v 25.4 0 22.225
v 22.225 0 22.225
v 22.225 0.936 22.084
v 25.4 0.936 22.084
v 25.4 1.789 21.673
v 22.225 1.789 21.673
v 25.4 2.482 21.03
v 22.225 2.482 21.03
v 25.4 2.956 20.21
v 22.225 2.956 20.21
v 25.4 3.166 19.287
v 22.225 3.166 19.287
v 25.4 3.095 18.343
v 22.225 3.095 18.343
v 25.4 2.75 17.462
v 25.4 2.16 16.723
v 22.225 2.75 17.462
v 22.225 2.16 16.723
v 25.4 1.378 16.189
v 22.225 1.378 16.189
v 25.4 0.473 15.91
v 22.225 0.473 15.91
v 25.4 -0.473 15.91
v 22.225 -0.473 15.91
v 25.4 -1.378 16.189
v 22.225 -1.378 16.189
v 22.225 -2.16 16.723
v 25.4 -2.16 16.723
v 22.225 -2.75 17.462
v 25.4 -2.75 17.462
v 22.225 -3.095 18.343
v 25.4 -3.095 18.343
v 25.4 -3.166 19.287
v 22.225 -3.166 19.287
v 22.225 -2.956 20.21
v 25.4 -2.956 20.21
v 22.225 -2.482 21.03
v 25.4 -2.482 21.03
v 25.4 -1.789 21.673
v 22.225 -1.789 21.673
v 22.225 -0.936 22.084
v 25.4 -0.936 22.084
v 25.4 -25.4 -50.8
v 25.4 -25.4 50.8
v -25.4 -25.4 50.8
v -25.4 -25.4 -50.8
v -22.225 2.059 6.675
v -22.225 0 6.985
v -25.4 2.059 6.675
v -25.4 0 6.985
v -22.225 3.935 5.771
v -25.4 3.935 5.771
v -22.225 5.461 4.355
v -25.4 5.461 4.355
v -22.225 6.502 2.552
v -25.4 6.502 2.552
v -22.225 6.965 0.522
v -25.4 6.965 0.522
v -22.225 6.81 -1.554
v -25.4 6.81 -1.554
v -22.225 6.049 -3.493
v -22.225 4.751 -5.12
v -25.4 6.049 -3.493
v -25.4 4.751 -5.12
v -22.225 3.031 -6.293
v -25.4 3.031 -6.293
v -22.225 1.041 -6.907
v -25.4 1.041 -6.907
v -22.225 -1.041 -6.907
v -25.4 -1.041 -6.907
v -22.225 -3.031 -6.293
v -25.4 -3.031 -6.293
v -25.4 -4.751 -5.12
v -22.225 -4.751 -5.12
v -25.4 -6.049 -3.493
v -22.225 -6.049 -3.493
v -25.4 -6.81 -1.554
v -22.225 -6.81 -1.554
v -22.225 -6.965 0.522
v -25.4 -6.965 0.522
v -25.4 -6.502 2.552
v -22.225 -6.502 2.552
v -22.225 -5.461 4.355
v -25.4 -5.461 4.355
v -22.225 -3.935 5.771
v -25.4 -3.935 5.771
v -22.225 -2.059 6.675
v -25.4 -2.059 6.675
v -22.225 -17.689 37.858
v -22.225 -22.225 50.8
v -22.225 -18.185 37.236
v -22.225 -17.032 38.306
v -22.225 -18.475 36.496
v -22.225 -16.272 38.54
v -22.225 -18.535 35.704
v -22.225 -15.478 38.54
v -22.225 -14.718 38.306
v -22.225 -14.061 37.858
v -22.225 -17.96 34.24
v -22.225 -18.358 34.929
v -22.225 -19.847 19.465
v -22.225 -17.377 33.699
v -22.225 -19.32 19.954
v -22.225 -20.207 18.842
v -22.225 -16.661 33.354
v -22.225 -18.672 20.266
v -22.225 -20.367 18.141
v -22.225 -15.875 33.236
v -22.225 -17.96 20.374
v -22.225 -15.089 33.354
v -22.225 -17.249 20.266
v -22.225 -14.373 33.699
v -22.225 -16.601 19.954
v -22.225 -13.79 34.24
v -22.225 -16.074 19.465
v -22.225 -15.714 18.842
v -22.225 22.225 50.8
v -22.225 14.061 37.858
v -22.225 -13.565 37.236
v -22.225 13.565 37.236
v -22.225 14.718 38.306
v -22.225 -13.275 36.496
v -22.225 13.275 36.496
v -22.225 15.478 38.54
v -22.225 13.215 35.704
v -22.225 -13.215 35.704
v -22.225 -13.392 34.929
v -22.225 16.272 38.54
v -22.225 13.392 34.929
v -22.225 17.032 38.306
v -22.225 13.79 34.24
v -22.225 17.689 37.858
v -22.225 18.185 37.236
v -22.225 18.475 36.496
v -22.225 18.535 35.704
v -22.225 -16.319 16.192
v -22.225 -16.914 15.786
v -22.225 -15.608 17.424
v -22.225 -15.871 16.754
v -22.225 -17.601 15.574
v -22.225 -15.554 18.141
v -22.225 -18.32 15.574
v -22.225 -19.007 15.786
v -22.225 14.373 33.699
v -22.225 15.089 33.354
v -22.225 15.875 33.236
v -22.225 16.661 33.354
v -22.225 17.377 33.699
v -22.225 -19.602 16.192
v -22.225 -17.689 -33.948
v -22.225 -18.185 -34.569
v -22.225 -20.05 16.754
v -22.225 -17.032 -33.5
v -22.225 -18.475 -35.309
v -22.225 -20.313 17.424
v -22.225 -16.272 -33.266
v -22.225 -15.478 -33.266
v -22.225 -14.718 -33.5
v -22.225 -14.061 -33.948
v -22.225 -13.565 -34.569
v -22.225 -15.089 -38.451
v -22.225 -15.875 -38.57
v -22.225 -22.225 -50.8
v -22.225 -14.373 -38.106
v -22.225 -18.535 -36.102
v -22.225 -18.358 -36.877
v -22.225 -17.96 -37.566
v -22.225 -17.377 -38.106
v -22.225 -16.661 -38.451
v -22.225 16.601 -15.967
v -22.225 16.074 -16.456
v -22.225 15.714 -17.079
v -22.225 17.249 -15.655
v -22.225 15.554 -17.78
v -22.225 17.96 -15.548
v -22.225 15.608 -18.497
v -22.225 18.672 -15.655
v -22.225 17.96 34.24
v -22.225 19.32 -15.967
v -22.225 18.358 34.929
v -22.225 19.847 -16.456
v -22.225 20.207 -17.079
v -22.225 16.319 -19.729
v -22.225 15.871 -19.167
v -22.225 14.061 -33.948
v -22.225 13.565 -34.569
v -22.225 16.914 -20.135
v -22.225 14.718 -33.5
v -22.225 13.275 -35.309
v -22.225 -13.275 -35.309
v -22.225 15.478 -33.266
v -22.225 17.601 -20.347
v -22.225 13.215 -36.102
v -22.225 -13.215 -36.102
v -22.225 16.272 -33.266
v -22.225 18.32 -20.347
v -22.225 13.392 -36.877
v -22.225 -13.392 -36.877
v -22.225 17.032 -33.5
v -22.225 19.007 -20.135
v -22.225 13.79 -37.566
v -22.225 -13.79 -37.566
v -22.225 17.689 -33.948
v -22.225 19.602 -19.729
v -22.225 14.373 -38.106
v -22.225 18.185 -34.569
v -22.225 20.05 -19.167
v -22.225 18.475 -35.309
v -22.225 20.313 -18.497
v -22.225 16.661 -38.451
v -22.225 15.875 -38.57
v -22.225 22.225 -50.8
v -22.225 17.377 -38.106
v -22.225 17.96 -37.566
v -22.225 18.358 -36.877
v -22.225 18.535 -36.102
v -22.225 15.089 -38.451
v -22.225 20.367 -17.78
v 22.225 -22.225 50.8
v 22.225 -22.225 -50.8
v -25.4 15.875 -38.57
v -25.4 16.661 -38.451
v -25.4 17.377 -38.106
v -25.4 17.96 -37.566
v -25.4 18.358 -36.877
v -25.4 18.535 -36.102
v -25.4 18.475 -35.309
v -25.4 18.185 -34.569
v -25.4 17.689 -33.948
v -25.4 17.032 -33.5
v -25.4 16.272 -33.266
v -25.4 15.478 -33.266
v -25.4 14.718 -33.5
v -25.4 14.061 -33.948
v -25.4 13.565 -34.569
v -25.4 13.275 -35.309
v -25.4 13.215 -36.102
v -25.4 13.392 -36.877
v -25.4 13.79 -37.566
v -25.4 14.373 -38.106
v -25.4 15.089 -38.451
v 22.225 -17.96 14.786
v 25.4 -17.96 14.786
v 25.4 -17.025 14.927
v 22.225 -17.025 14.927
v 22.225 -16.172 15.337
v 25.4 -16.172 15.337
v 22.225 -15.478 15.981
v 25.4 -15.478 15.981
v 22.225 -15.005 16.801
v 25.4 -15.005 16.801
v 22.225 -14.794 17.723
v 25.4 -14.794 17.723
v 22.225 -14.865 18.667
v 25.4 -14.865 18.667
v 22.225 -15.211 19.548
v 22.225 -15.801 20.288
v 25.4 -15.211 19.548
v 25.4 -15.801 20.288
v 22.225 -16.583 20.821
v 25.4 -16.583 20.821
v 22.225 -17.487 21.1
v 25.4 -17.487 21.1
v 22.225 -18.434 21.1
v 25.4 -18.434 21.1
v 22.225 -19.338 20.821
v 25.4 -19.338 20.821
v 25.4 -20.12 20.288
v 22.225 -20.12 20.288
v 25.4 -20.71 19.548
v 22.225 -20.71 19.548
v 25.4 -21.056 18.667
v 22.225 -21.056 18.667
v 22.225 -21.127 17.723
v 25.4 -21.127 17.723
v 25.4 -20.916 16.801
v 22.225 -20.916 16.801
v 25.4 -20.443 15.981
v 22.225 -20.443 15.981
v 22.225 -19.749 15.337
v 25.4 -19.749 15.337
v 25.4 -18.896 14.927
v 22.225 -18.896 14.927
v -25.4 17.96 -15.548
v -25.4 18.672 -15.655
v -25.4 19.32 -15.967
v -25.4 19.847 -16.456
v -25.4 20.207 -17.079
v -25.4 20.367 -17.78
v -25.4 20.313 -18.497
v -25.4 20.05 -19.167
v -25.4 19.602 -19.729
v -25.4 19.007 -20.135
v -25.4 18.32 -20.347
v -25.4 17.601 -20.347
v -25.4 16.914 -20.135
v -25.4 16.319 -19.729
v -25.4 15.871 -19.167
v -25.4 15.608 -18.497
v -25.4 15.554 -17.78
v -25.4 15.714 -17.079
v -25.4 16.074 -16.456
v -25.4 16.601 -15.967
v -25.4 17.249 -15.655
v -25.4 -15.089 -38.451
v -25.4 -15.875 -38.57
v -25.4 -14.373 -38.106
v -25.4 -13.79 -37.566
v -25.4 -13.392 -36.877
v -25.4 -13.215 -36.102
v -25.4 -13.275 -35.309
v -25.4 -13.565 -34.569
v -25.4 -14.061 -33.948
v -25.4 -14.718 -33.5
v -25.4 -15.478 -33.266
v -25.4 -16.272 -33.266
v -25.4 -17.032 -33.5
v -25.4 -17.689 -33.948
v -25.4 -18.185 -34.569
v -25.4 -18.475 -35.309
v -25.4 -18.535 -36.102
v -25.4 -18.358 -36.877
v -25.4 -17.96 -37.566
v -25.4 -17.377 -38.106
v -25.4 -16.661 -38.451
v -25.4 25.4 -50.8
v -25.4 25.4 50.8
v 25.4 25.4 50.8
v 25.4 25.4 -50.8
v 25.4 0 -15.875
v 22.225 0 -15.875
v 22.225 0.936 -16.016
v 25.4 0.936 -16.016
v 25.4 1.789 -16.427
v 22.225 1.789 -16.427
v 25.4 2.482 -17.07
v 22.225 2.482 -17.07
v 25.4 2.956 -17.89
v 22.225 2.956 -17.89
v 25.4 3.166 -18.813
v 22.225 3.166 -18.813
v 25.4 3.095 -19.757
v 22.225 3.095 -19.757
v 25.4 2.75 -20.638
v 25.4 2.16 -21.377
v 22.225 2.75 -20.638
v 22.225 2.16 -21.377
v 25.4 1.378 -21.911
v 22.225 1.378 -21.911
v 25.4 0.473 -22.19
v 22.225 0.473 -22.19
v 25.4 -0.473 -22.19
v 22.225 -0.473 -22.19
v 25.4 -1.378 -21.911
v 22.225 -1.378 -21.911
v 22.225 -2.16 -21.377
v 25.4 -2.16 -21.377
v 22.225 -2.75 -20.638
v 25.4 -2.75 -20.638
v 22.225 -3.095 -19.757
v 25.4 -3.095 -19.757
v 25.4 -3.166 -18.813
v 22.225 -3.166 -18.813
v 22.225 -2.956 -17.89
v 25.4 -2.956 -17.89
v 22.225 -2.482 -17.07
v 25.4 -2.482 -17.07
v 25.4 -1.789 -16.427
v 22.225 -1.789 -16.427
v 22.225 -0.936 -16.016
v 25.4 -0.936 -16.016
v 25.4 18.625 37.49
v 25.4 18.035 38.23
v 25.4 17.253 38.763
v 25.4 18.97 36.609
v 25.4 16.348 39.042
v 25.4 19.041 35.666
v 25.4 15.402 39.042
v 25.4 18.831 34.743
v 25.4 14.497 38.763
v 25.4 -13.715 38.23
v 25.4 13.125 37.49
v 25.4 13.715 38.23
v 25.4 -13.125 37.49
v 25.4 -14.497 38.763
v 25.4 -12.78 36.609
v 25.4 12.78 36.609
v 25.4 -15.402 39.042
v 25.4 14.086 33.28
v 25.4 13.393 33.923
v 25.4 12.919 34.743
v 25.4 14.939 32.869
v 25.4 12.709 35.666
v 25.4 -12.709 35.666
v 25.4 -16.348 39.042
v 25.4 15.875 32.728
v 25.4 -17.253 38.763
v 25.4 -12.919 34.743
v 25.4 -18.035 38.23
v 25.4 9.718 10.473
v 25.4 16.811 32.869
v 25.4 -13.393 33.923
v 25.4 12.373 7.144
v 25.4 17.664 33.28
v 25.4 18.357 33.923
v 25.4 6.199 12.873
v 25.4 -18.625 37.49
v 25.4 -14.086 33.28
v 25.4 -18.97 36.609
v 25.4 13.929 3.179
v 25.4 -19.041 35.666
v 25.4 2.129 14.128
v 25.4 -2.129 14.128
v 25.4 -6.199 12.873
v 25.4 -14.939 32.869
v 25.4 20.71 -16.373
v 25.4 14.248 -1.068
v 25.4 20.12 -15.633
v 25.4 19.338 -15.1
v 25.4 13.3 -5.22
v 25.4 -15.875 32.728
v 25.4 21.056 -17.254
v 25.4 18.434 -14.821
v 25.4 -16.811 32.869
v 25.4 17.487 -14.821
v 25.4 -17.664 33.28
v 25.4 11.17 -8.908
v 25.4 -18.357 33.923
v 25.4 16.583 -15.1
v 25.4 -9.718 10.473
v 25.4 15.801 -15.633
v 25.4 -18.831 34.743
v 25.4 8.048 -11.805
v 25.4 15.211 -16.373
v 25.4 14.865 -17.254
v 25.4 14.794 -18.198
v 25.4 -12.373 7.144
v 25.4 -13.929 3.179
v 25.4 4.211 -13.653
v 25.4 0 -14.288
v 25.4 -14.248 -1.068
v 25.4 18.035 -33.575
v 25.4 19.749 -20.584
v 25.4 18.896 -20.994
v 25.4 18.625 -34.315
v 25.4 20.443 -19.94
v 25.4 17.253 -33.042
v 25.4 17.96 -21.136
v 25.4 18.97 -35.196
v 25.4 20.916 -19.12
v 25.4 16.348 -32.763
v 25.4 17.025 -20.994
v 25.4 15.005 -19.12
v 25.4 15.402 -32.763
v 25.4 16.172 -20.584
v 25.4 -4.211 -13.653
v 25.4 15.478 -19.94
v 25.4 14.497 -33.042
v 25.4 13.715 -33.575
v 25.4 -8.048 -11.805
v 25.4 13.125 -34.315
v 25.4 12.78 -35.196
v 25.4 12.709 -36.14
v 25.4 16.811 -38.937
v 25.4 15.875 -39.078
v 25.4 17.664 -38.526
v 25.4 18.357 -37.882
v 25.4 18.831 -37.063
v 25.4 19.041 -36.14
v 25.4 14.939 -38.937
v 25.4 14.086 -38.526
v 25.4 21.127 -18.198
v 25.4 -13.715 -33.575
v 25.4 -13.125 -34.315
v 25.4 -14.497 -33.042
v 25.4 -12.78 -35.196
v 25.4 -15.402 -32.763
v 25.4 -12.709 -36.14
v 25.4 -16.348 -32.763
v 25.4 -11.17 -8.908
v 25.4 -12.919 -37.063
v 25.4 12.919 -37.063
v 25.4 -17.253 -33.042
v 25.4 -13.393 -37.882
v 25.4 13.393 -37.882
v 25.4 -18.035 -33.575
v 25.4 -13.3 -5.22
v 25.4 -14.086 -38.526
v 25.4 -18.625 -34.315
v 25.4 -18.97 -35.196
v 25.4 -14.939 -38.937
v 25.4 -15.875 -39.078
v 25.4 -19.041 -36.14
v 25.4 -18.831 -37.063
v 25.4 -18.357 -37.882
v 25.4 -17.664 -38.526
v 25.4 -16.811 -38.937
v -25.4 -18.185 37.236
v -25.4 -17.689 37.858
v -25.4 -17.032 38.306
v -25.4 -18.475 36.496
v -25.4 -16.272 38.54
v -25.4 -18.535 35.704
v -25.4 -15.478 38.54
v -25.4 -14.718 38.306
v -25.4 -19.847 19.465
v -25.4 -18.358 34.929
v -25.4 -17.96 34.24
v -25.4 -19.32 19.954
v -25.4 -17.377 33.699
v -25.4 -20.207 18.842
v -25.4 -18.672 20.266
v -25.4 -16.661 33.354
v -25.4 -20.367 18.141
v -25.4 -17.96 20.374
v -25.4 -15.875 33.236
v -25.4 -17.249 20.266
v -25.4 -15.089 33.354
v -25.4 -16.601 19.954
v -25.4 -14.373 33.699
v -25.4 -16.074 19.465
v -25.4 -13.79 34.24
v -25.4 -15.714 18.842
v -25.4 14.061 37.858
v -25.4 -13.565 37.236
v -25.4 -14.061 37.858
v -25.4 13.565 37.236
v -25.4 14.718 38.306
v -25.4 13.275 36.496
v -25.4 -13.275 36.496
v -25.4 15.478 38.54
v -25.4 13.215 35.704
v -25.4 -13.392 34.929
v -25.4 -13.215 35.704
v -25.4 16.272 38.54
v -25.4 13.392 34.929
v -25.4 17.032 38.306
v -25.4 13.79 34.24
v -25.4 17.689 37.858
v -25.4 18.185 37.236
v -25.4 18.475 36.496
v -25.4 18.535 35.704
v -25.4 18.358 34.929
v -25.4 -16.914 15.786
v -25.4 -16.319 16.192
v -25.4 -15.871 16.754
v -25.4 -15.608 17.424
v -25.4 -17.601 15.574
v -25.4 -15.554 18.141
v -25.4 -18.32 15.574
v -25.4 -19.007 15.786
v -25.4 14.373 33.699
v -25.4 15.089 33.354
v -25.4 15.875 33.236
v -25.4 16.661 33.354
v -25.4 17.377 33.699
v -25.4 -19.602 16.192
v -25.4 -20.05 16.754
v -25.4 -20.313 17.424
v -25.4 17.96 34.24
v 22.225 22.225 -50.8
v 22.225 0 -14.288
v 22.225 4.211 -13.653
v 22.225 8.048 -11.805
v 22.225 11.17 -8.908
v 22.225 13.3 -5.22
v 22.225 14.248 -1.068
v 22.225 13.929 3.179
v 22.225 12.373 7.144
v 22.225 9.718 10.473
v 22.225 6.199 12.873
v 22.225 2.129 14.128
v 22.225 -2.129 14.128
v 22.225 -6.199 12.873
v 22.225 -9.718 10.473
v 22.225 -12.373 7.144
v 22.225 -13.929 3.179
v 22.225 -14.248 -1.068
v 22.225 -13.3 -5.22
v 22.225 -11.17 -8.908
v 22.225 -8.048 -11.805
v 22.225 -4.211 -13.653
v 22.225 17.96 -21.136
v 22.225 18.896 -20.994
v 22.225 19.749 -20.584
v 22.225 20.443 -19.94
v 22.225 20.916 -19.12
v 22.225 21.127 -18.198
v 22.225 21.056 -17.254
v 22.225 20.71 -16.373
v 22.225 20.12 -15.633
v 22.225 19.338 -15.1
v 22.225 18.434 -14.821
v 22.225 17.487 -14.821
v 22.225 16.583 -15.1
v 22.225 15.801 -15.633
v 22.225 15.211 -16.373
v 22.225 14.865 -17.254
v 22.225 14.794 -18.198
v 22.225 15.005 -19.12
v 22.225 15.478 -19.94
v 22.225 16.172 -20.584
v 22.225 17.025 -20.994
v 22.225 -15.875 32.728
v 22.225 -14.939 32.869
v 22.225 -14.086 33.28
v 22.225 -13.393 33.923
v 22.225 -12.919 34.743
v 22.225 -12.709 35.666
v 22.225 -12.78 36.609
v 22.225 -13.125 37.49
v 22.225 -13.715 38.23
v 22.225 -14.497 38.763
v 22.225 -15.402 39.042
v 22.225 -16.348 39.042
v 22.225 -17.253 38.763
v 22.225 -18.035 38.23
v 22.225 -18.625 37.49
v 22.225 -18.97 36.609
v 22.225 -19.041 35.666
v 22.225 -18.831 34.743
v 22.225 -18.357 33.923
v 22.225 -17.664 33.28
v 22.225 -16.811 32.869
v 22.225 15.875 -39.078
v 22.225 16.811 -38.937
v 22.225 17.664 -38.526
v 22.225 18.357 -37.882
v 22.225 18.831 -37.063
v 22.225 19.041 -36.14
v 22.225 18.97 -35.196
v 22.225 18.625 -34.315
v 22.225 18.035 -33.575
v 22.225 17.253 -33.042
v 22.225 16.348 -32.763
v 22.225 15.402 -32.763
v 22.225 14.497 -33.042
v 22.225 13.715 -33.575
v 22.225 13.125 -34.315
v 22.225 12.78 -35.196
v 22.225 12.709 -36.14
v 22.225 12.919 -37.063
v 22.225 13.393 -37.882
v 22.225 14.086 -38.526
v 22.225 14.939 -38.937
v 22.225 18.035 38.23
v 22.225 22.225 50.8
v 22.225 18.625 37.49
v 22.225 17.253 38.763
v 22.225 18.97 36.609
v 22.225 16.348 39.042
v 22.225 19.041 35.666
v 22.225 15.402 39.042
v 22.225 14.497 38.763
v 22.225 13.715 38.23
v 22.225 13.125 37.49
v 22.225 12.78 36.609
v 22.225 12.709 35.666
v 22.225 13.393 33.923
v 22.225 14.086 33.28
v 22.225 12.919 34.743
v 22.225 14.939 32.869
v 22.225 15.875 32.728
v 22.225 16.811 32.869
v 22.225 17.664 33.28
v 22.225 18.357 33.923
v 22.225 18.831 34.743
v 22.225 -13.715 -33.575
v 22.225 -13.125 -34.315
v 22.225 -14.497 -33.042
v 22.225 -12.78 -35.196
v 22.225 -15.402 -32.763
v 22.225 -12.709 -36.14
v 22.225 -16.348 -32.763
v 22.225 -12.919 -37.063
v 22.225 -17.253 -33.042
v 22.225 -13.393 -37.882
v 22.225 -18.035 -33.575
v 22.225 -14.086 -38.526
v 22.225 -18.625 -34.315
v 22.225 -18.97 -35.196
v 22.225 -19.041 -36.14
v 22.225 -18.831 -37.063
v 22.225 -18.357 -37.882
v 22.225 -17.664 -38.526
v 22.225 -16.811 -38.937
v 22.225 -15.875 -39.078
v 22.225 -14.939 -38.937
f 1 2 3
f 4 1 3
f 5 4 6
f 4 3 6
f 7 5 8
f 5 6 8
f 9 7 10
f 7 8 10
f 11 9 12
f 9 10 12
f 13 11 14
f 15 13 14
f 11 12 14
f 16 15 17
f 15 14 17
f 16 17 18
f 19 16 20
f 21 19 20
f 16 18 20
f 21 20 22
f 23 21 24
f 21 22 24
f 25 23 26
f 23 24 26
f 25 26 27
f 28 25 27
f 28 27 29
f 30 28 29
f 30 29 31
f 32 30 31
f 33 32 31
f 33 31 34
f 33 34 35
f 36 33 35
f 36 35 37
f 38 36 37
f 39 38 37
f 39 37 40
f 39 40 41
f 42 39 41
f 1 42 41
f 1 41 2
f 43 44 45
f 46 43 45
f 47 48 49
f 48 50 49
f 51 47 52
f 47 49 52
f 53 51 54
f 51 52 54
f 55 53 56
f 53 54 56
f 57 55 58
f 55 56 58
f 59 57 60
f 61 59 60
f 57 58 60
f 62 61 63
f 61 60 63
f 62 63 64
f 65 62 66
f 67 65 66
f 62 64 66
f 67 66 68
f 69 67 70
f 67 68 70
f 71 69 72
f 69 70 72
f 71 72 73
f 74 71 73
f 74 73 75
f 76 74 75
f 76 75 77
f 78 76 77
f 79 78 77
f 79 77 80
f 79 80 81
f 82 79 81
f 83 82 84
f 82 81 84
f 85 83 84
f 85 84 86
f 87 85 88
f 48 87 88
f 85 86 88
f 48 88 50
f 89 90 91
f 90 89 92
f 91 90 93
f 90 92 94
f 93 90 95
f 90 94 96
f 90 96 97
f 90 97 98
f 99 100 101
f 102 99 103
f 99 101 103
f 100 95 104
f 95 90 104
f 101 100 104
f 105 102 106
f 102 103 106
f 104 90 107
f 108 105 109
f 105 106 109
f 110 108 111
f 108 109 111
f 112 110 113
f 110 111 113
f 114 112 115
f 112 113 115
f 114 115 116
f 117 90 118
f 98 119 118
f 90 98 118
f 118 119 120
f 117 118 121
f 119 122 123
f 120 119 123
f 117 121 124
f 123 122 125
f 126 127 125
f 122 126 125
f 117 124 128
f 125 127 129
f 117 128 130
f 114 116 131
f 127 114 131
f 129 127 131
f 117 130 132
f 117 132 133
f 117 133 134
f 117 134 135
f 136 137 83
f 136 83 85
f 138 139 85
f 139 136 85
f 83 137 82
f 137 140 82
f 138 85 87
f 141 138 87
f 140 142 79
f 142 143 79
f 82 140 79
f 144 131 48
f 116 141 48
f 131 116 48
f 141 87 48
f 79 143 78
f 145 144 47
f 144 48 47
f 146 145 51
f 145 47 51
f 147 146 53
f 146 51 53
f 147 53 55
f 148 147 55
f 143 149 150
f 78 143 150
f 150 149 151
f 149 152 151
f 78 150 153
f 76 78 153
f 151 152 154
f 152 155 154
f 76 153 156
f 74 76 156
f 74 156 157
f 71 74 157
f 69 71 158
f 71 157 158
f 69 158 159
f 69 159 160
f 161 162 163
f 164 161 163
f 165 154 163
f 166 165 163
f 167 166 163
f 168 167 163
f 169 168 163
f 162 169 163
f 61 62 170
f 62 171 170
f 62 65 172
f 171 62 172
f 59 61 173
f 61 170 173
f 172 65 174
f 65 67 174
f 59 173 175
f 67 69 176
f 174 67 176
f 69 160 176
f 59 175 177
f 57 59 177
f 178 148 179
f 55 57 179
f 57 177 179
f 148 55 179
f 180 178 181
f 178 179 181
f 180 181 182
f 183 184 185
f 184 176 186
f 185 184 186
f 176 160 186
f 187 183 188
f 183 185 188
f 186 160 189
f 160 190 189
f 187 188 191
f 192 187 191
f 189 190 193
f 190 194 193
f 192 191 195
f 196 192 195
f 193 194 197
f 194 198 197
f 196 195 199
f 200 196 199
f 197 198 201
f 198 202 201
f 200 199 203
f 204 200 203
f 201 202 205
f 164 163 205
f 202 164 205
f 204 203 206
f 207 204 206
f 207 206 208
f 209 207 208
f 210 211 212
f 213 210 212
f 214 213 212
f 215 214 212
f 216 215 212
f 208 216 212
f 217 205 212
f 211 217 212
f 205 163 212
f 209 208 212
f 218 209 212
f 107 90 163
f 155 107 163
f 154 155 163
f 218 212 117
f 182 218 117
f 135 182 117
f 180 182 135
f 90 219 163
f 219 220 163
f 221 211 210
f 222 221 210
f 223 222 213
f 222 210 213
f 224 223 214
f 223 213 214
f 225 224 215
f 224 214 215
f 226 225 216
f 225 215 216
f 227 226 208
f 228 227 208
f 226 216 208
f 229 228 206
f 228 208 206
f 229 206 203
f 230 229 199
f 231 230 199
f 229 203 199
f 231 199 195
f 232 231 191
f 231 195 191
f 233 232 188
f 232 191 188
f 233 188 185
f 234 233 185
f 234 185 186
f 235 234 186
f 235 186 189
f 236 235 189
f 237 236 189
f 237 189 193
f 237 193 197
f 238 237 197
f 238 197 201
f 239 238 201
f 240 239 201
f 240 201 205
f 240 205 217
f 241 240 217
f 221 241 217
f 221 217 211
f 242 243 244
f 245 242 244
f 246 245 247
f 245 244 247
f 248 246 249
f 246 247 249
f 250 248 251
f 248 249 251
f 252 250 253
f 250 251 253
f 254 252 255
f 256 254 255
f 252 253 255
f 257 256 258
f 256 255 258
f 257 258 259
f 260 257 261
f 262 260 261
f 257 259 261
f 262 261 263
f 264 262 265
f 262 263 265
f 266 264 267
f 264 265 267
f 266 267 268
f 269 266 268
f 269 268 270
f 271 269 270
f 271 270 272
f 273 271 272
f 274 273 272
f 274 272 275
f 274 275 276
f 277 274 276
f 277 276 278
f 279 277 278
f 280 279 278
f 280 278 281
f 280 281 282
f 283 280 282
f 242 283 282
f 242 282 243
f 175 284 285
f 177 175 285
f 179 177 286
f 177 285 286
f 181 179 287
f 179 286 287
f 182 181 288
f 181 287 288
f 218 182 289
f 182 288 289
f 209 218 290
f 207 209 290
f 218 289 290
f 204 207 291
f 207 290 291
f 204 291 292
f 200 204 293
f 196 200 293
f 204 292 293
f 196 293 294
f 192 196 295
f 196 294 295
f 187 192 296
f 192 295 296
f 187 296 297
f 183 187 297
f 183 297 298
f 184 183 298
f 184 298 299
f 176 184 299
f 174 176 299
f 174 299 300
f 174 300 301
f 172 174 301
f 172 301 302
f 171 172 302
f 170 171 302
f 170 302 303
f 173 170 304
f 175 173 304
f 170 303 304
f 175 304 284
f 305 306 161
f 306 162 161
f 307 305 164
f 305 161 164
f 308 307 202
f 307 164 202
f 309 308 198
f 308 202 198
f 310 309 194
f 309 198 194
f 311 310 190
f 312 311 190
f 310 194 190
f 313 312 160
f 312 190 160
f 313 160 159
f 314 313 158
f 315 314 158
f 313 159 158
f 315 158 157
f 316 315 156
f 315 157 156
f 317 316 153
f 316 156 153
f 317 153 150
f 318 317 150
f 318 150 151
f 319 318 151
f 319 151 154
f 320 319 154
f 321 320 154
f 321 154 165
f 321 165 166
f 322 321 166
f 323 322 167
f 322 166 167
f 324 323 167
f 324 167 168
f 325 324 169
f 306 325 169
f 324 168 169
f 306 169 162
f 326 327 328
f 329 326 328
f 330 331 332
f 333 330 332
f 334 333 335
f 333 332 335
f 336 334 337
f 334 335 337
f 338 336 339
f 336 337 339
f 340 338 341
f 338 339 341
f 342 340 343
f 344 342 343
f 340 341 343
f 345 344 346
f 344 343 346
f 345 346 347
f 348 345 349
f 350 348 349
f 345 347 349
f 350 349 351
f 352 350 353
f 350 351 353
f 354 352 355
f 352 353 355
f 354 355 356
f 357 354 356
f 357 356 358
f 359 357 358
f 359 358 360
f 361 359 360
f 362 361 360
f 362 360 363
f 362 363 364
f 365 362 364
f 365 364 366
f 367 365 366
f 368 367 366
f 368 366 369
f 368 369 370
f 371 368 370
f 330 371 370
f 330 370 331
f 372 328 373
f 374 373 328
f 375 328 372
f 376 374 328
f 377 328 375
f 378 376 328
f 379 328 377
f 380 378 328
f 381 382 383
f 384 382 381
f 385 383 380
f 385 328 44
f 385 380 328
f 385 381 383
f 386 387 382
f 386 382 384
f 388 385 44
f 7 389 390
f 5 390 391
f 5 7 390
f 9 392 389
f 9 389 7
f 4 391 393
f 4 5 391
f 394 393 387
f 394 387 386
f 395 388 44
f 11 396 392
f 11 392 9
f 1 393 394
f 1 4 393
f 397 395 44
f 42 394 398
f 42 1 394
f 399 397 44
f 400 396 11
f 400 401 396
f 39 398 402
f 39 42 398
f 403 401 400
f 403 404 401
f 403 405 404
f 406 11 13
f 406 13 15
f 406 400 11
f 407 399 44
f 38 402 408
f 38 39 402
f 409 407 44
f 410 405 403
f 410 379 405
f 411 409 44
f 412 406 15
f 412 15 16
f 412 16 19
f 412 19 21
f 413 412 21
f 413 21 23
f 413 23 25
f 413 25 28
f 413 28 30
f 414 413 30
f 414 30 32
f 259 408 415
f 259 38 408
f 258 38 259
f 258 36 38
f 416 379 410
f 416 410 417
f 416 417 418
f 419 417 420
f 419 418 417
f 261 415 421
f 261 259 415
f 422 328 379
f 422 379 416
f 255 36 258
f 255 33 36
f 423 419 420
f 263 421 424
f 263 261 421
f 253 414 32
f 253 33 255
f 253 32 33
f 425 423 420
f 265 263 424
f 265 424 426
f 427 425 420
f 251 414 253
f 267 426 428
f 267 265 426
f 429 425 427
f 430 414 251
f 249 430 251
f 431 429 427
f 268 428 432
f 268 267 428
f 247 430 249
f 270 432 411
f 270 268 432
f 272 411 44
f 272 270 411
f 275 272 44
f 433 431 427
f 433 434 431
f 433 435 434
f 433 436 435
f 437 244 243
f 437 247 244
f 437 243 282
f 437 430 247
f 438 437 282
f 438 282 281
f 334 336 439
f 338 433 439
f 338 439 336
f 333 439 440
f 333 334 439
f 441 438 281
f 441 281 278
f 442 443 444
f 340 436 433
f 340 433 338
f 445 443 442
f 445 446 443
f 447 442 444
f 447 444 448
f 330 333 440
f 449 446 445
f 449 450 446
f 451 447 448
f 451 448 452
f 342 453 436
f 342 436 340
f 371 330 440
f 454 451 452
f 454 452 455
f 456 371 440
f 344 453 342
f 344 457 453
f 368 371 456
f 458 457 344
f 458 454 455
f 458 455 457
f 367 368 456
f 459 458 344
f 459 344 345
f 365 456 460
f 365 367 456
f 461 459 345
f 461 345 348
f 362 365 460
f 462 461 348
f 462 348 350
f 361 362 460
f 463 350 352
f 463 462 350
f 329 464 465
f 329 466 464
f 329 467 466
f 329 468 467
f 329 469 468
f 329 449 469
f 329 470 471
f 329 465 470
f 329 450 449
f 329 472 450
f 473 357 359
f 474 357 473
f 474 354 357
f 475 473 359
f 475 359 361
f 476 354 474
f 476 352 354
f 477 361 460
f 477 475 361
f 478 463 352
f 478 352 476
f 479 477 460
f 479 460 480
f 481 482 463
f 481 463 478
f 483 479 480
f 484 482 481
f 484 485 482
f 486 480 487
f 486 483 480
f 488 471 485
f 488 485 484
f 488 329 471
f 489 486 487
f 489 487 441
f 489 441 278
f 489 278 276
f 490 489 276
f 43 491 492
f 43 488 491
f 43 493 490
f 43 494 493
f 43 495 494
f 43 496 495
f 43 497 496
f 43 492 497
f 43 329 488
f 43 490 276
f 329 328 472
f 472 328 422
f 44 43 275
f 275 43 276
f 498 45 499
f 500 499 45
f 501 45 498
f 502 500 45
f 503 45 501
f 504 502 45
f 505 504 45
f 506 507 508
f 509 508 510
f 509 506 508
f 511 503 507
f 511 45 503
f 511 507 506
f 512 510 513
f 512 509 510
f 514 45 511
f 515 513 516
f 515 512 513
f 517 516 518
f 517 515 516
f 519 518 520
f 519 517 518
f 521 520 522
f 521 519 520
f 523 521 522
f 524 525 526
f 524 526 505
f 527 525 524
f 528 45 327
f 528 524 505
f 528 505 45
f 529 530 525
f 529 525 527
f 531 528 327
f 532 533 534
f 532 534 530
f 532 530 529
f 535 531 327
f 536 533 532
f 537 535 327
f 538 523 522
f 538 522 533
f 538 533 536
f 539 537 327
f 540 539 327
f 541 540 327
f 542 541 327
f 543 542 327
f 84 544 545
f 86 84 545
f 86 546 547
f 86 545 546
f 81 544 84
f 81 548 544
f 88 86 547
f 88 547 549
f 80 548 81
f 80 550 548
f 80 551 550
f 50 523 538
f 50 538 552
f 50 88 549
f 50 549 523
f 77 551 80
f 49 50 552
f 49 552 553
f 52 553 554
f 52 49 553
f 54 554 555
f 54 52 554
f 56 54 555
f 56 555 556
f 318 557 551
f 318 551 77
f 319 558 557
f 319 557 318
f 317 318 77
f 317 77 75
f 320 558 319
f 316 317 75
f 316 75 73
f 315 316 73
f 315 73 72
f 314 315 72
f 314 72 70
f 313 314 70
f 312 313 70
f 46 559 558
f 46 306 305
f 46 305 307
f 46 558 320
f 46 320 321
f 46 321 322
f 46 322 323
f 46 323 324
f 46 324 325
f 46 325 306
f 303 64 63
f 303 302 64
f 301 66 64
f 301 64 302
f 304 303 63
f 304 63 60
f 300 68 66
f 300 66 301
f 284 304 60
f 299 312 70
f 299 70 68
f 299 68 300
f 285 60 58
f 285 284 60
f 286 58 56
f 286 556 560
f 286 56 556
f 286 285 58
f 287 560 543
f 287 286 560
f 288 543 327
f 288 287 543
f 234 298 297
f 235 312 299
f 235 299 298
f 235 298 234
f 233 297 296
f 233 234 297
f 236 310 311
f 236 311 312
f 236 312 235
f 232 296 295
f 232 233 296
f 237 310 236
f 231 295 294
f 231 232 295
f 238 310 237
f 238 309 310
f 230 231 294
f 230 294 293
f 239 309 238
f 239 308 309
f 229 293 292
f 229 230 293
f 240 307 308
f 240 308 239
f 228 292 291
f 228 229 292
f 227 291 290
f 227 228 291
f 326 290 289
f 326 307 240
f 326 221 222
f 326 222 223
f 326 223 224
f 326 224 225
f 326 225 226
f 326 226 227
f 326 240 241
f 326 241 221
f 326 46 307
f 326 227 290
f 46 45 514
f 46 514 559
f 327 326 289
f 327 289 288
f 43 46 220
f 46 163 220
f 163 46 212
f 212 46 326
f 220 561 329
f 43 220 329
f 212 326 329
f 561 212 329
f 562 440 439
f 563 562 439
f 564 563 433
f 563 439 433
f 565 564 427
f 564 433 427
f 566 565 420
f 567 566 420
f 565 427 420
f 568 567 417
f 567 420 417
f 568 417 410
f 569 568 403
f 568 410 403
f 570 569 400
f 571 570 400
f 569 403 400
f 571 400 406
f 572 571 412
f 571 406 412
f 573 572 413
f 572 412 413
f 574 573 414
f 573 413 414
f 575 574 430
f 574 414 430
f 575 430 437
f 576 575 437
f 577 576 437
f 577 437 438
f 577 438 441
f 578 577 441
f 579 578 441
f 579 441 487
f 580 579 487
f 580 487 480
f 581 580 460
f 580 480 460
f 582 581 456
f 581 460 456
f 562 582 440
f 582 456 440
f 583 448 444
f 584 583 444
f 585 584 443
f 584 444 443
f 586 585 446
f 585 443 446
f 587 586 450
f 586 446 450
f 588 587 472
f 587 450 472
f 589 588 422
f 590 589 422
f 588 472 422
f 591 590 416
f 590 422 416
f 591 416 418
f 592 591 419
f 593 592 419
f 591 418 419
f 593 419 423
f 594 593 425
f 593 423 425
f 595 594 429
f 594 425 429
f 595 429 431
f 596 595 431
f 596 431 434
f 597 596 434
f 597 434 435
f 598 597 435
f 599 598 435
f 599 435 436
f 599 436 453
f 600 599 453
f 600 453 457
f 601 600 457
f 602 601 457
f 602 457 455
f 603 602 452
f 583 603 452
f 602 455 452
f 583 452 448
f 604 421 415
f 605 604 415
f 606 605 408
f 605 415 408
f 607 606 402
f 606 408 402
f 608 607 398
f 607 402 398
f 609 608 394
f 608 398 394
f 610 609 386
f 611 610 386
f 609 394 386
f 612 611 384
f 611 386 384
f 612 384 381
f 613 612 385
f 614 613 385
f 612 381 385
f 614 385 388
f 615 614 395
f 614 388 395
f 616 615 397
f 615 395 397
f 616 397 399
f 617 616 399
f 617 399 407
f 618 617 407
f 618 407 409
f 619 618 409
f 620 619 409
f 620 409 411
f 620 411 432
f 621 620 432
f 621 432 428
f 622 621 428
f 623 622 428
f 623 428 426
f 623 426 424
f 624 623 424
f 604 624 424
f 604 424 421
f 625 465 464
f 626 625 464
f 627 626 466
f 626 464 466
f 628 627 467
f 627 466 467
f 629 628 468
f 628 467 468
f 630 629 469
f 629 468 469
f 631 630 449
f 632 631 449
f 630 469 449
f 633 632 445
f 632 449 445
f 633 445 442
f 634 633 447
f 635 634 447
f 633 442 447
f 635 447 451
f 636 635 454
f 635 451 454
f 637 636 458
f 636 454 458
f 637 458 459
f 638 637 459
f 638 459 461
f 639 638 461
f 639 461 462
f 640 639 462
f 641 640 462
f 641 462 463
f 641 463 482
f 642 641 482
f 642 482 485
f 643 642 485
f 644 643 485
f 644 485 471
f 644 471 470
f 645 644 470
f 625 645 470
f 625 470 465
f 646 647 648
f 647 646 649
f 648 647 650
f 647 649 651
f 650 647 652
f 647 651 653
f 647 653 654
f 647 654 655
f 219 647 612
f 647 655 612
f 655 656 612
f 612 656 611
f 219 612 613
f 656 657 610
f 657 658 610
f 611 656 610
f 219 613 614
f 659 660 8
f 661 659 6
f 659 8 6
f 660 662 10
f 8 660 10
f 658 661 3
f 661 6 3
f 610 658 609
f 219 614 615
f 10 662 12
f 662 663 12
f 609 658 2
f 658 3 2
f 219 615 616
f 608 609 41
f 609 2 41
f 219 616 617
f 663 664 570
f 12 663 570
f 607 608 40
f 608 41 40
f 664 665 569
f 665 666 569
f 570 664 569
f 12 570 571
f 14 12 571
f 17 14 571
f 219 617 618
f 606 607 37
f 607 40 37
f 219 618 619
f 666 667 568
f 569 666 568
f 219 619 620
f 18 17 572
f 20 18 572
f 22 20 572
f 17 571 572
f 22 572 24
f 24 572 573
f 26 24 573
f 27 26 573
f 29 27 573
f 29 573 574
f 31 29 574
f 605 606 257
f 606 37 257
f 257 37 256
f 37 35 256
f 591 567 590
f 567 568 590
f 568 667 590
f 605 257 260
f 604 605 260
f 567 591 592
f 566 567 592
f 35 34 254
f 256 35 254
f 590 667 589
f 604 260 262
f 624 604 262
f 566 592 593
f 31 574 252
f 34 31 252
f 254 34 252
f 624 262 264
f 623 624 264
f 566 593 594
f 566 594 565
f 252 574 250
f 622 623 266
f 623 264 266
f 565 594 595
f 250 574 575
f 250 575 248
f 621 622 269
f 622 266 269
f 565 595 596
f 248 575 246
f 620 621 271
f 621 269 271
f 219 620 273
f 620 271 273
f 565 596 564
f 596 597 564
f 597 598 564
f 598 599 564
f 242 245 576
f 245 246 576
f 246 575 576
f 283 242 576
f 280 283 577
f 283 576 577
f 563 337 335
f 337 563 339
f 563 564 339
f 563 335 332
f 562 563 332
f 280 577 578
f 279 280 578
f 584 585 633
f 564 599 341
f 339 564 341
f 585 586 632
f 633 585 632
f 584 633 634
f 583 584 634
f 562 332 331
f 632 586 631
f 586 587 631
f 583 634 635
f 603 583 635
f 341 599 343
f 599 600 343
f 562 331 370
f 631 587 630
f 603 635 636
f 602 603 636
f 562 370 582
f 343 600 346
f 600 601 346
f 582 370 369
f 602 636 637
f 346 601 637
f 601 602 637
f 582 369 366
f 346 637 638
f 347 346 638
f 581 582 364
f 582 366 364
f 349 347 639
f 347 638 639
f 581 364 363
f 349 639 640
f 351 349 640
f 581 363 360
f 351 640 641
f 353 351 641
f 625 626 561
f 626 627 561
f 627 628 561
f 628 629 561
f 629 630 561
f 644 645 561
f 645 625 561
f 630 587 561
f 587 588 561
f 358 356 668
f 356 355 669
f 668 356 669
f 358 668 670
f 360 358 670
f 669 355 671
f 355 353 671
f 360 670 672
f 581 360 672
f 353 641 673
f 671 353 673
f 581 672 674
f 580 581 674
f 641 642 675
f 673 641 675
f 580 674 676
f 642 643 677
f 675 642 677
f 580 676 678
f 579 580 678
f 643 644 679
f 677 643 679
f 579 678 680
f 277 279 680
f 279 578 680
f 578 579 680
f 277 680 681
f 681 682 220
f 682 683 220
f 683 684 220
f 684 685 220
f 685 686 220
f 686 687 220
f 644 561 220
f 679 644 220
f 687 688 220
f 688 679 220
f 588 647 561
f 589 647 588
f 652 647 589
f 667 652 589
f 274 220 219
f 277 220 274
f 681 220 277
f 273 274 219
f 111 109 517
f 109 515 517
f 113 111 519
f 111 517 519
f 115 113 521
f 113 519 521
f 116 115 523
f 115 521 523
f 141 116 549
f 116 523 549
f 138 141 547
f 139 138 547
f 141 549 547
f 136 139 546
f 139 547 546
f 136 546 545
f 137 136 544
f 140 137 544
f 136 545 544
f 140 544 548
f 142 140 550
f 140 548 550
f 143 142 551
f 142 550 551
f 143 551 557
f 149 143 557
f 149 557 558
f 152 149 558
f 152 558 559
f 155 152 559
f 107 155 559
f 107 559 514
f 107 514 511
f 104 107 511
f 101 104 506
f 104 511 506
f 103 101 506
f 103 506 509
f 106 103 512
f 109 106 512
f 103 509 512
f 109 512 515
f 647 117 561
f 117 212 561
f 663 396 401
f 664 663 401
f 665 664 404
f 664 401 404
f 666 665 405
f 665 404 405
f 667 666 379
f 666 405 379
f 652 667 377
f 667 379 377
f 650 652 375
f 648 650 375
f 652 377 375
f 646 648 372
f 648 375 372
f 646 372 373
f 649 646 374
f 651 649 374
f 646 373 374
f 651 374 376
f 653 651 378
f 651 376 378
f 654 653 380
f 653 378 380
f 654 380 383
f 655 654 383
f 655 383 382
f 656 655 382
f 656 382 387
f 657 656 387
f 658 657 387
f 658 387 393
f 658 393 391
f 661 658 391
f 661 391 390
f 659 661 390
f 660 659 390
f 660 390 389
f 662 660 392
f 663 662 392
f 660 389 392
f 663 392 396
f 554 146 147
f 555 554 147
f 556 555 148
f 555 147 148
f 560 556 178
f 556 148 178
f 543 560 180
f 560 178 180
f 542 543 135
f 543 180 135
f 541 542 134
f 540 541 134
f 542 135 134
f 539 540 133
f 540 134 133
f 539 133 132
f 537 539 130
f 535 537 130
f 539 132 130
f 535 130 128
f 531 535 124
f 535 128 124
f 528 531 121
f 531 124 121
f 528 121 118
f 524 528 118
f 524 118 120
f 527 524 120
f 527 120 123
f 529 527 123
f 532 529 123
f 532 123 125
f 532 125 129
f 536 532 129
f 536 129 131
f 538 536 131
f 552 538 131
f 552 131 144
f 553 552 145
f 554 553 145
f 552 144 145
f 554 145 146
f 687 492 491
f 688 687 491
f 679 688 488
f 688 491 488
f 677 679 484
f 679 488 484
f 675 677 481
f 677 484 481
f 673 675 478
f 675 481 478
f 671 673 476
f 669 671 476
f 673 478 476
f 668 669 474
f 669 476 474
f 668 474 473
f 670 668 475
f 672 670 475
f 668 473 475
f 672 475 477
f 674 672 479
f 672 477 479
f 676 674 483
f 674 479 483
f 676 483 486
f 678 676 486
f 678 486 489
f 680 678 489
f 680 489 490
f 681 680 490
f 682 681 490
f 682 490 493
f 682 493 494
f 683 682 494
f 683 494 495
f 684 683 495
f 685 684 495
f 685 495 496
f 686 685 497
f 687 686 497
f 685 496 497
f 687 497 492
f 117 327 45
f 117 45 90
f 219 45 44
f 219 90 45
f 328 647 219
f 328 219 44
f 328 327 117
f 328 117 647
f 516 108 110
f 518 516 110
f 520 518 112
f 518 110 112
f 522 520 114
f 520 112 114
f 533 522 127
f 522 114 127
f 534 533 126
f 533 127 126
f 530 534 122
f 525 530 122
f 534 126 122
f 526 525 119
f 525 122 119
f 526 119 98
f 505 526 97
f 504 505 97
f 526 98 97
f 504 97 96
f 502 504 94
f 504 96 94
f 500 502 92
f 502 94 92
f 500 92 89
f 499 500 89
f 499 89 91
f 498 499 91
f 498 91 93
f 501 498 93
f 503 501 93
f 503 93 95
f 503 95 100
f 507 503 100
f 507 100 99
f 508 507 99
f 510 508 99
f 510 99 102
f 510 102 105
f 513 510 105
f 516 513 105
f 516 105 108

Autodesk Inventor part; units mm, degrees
ref_plane "YZ Plane" through (0, 0, 0) normal (1, 0, 0) x (0, 1, 0)
ref_plane "XZ Plane" through (0, 0, 0) normal (0, 1, 0) x (-1, 0, 0)
ref_plane "XY Plane" through (0, 0, 0) normal (0, 0, 1) x (1, 0, 0)
sketch "Sketch1" plane through (0, 0, 0) normal (0, 0, 1) x (1, 0, 0)
  line L0 (-35.56, 0) -> (35.56, 0) construction
  line L1 (0, -35.56) -> (0, 35.56) construction
  line L2 (-25.4, 25.4) -> (25.4, 25.4)
  line L3 (25.4, 25.4) -> (25.4, -25.4)
  line L4 (25.4, -25.4) -> (-25.4, -25.4)
  line L5 (-25.4, -25.4) -> (-25.4, 25.4)
  line L6 (-22.225, 22.225) -> (22.225, 22.225)
  line L7 (22.225, 22.225) -> (22.225, -22.225)
  line L8 (22.225, -22.225) -> (-22.225, -22.225)
  line L9 (-22.225, -22.225) -> (-22.225, 22.225)
  point P0 (0, 0)
  point P1 (-25.4, 0)
  point P2 (0, 25.4)
  point P3 (-22.225, 0)
  point P4 (0, 22.225)
  dimension "d0" = 50.8
  dimension "d1" = 3.175
  dimension "d11" = 50.8
  dimension "d12" = 3.175
extrude "Extrusion1" add sketch "Sketch1" along normal mid plane 101.6
sketch "Sketch6" plane through (-25.4, -25.4, 50.8) normal (-1, 0, 0) x (0, 0, 1)
  circle A0 centre (-68.7605, 43.3605) radius 2.0193 construction
  circle A1 centre (-32.8395, 7.4395) radius 2.0193 construction
  circle A2 centre (-50.8, 25.4) radius 6.985 projected
  line L0 (0, 47.625) -> (-101.6, 47.625) construction
  line L1 (-101.6, 3.175) -> (-101.6, 47.625) construction
  line L2 (0, 3.175) -> (-101.6, 3.175) construction
  line L3 (0, 47.625) -> (0, 3.175) construction
  circle A3 centre (-86.7029, 41.275) radius 3.175 projected
  circle A4 centre (-14.8971, 9.525) radius 3.175 projected
  circle A5 centre (-86.7029, 9.525) radius 3.175 projected
  circle A6 centre (-14.8971, 41.275) radius 3.175 projected
  circle A7 centre (-68.7605, 43.3605) radius 2.413
  circle A8 centre (-32.8395, 7.4395) radius 2.413
  point P0 (-50.8, 25.4)
  dimension "d38" = 4.826
sketch "Sketch7" plane through (25.4, -25.4, 50.8) normal (1, 0, 0) x (0, 0, -1)
  circle A0 centre (50.8, 25.4) radius 14.2875
  dimension "d25" = 28.575
extrude "Extrusion8" cut sketch "Sketch7" against normal up to next
sketch "Sketch8" plane through (-22.225, -22.225, -50.8) normal (1, 0, 0) x (0, 0, -1)
  circle A0 centre (-14.8971, 6.35) radius 2.667 projected
  circle A1 centre (-86.7029, 6.35) radius 2.667 projected
  circle A2 centre (-86.7029, 38.1) radius 2.667 projected
  circle A3 centre (-14.8971, 38.1) radius 2.667 projected
  point P0 (-50.8, 22.225)
extrude "Extrusion9" cut sketch "Sketch8" against normal up to next
sketch "Sketch9" plane through (25.4, -25.4, 50.8) normal (1, 0, 0) x (0, 0, -1)
  circle A0 centre (14.8971, 9.525) radius 3.175 projected
  circle A1 centre (14.8971, 41.275) radius 3.175 projected
  circle A2 centre (86.7029, 9.525) radius 3.175 projected
  circle A3 centre (86.7029, 41.275) radius 3.175 projected
  point P0 (50.8, 25.4)
extrude "Extrusion10" cut sketch "Sketch9" against normal up to next
sketch "Sketch10" plane through (22.225, -22.225, -50.8) normal (-1, 0, 0) x (0, 0, 1)
  circle A0 centre (69.85, 22.225) radius 2.667 construction
  circle A1 centre (31.75, 22.225) radius 2.667 construction
  circle A2 centre (69.85, 22.225) radius 3.175
  circle A3 centre (31.75, 22.225) radius 3.175
  point P0 (50.8, 22.225)
  dimension "d32" = 6.35
extrude "Extrusion11" cut sketch "Sketch10" against normal through all
sketch "Sketch11" plane through (25.4, -25.4, 50.8) normal (1, 0, 0) x (0, 0, -1)
  circle A0 centre (68.7605, 43.3605) radius 2.0193 construction
  circle A1 centre (32.8395, 7.4395) radius 2.0193 construction
  circle A2 centre (68.7605, 43.3605) radius 3.175
  circle A3 centre (32.8395, 7.4395) radius 3.175
  point P0 (50.8, 25.4)
  dimension "d35" = 6.35
extrude "Extrusion12" cut sketch "Sketch11" against normal up to next
extrude "Extrusion13" cut sketch "Sketch6" against normal up to next contours A2 | A7 | A8
equation "\"d12\" = d1"
properties part number "Arm 4 inch" material "Aluminum 6061"
